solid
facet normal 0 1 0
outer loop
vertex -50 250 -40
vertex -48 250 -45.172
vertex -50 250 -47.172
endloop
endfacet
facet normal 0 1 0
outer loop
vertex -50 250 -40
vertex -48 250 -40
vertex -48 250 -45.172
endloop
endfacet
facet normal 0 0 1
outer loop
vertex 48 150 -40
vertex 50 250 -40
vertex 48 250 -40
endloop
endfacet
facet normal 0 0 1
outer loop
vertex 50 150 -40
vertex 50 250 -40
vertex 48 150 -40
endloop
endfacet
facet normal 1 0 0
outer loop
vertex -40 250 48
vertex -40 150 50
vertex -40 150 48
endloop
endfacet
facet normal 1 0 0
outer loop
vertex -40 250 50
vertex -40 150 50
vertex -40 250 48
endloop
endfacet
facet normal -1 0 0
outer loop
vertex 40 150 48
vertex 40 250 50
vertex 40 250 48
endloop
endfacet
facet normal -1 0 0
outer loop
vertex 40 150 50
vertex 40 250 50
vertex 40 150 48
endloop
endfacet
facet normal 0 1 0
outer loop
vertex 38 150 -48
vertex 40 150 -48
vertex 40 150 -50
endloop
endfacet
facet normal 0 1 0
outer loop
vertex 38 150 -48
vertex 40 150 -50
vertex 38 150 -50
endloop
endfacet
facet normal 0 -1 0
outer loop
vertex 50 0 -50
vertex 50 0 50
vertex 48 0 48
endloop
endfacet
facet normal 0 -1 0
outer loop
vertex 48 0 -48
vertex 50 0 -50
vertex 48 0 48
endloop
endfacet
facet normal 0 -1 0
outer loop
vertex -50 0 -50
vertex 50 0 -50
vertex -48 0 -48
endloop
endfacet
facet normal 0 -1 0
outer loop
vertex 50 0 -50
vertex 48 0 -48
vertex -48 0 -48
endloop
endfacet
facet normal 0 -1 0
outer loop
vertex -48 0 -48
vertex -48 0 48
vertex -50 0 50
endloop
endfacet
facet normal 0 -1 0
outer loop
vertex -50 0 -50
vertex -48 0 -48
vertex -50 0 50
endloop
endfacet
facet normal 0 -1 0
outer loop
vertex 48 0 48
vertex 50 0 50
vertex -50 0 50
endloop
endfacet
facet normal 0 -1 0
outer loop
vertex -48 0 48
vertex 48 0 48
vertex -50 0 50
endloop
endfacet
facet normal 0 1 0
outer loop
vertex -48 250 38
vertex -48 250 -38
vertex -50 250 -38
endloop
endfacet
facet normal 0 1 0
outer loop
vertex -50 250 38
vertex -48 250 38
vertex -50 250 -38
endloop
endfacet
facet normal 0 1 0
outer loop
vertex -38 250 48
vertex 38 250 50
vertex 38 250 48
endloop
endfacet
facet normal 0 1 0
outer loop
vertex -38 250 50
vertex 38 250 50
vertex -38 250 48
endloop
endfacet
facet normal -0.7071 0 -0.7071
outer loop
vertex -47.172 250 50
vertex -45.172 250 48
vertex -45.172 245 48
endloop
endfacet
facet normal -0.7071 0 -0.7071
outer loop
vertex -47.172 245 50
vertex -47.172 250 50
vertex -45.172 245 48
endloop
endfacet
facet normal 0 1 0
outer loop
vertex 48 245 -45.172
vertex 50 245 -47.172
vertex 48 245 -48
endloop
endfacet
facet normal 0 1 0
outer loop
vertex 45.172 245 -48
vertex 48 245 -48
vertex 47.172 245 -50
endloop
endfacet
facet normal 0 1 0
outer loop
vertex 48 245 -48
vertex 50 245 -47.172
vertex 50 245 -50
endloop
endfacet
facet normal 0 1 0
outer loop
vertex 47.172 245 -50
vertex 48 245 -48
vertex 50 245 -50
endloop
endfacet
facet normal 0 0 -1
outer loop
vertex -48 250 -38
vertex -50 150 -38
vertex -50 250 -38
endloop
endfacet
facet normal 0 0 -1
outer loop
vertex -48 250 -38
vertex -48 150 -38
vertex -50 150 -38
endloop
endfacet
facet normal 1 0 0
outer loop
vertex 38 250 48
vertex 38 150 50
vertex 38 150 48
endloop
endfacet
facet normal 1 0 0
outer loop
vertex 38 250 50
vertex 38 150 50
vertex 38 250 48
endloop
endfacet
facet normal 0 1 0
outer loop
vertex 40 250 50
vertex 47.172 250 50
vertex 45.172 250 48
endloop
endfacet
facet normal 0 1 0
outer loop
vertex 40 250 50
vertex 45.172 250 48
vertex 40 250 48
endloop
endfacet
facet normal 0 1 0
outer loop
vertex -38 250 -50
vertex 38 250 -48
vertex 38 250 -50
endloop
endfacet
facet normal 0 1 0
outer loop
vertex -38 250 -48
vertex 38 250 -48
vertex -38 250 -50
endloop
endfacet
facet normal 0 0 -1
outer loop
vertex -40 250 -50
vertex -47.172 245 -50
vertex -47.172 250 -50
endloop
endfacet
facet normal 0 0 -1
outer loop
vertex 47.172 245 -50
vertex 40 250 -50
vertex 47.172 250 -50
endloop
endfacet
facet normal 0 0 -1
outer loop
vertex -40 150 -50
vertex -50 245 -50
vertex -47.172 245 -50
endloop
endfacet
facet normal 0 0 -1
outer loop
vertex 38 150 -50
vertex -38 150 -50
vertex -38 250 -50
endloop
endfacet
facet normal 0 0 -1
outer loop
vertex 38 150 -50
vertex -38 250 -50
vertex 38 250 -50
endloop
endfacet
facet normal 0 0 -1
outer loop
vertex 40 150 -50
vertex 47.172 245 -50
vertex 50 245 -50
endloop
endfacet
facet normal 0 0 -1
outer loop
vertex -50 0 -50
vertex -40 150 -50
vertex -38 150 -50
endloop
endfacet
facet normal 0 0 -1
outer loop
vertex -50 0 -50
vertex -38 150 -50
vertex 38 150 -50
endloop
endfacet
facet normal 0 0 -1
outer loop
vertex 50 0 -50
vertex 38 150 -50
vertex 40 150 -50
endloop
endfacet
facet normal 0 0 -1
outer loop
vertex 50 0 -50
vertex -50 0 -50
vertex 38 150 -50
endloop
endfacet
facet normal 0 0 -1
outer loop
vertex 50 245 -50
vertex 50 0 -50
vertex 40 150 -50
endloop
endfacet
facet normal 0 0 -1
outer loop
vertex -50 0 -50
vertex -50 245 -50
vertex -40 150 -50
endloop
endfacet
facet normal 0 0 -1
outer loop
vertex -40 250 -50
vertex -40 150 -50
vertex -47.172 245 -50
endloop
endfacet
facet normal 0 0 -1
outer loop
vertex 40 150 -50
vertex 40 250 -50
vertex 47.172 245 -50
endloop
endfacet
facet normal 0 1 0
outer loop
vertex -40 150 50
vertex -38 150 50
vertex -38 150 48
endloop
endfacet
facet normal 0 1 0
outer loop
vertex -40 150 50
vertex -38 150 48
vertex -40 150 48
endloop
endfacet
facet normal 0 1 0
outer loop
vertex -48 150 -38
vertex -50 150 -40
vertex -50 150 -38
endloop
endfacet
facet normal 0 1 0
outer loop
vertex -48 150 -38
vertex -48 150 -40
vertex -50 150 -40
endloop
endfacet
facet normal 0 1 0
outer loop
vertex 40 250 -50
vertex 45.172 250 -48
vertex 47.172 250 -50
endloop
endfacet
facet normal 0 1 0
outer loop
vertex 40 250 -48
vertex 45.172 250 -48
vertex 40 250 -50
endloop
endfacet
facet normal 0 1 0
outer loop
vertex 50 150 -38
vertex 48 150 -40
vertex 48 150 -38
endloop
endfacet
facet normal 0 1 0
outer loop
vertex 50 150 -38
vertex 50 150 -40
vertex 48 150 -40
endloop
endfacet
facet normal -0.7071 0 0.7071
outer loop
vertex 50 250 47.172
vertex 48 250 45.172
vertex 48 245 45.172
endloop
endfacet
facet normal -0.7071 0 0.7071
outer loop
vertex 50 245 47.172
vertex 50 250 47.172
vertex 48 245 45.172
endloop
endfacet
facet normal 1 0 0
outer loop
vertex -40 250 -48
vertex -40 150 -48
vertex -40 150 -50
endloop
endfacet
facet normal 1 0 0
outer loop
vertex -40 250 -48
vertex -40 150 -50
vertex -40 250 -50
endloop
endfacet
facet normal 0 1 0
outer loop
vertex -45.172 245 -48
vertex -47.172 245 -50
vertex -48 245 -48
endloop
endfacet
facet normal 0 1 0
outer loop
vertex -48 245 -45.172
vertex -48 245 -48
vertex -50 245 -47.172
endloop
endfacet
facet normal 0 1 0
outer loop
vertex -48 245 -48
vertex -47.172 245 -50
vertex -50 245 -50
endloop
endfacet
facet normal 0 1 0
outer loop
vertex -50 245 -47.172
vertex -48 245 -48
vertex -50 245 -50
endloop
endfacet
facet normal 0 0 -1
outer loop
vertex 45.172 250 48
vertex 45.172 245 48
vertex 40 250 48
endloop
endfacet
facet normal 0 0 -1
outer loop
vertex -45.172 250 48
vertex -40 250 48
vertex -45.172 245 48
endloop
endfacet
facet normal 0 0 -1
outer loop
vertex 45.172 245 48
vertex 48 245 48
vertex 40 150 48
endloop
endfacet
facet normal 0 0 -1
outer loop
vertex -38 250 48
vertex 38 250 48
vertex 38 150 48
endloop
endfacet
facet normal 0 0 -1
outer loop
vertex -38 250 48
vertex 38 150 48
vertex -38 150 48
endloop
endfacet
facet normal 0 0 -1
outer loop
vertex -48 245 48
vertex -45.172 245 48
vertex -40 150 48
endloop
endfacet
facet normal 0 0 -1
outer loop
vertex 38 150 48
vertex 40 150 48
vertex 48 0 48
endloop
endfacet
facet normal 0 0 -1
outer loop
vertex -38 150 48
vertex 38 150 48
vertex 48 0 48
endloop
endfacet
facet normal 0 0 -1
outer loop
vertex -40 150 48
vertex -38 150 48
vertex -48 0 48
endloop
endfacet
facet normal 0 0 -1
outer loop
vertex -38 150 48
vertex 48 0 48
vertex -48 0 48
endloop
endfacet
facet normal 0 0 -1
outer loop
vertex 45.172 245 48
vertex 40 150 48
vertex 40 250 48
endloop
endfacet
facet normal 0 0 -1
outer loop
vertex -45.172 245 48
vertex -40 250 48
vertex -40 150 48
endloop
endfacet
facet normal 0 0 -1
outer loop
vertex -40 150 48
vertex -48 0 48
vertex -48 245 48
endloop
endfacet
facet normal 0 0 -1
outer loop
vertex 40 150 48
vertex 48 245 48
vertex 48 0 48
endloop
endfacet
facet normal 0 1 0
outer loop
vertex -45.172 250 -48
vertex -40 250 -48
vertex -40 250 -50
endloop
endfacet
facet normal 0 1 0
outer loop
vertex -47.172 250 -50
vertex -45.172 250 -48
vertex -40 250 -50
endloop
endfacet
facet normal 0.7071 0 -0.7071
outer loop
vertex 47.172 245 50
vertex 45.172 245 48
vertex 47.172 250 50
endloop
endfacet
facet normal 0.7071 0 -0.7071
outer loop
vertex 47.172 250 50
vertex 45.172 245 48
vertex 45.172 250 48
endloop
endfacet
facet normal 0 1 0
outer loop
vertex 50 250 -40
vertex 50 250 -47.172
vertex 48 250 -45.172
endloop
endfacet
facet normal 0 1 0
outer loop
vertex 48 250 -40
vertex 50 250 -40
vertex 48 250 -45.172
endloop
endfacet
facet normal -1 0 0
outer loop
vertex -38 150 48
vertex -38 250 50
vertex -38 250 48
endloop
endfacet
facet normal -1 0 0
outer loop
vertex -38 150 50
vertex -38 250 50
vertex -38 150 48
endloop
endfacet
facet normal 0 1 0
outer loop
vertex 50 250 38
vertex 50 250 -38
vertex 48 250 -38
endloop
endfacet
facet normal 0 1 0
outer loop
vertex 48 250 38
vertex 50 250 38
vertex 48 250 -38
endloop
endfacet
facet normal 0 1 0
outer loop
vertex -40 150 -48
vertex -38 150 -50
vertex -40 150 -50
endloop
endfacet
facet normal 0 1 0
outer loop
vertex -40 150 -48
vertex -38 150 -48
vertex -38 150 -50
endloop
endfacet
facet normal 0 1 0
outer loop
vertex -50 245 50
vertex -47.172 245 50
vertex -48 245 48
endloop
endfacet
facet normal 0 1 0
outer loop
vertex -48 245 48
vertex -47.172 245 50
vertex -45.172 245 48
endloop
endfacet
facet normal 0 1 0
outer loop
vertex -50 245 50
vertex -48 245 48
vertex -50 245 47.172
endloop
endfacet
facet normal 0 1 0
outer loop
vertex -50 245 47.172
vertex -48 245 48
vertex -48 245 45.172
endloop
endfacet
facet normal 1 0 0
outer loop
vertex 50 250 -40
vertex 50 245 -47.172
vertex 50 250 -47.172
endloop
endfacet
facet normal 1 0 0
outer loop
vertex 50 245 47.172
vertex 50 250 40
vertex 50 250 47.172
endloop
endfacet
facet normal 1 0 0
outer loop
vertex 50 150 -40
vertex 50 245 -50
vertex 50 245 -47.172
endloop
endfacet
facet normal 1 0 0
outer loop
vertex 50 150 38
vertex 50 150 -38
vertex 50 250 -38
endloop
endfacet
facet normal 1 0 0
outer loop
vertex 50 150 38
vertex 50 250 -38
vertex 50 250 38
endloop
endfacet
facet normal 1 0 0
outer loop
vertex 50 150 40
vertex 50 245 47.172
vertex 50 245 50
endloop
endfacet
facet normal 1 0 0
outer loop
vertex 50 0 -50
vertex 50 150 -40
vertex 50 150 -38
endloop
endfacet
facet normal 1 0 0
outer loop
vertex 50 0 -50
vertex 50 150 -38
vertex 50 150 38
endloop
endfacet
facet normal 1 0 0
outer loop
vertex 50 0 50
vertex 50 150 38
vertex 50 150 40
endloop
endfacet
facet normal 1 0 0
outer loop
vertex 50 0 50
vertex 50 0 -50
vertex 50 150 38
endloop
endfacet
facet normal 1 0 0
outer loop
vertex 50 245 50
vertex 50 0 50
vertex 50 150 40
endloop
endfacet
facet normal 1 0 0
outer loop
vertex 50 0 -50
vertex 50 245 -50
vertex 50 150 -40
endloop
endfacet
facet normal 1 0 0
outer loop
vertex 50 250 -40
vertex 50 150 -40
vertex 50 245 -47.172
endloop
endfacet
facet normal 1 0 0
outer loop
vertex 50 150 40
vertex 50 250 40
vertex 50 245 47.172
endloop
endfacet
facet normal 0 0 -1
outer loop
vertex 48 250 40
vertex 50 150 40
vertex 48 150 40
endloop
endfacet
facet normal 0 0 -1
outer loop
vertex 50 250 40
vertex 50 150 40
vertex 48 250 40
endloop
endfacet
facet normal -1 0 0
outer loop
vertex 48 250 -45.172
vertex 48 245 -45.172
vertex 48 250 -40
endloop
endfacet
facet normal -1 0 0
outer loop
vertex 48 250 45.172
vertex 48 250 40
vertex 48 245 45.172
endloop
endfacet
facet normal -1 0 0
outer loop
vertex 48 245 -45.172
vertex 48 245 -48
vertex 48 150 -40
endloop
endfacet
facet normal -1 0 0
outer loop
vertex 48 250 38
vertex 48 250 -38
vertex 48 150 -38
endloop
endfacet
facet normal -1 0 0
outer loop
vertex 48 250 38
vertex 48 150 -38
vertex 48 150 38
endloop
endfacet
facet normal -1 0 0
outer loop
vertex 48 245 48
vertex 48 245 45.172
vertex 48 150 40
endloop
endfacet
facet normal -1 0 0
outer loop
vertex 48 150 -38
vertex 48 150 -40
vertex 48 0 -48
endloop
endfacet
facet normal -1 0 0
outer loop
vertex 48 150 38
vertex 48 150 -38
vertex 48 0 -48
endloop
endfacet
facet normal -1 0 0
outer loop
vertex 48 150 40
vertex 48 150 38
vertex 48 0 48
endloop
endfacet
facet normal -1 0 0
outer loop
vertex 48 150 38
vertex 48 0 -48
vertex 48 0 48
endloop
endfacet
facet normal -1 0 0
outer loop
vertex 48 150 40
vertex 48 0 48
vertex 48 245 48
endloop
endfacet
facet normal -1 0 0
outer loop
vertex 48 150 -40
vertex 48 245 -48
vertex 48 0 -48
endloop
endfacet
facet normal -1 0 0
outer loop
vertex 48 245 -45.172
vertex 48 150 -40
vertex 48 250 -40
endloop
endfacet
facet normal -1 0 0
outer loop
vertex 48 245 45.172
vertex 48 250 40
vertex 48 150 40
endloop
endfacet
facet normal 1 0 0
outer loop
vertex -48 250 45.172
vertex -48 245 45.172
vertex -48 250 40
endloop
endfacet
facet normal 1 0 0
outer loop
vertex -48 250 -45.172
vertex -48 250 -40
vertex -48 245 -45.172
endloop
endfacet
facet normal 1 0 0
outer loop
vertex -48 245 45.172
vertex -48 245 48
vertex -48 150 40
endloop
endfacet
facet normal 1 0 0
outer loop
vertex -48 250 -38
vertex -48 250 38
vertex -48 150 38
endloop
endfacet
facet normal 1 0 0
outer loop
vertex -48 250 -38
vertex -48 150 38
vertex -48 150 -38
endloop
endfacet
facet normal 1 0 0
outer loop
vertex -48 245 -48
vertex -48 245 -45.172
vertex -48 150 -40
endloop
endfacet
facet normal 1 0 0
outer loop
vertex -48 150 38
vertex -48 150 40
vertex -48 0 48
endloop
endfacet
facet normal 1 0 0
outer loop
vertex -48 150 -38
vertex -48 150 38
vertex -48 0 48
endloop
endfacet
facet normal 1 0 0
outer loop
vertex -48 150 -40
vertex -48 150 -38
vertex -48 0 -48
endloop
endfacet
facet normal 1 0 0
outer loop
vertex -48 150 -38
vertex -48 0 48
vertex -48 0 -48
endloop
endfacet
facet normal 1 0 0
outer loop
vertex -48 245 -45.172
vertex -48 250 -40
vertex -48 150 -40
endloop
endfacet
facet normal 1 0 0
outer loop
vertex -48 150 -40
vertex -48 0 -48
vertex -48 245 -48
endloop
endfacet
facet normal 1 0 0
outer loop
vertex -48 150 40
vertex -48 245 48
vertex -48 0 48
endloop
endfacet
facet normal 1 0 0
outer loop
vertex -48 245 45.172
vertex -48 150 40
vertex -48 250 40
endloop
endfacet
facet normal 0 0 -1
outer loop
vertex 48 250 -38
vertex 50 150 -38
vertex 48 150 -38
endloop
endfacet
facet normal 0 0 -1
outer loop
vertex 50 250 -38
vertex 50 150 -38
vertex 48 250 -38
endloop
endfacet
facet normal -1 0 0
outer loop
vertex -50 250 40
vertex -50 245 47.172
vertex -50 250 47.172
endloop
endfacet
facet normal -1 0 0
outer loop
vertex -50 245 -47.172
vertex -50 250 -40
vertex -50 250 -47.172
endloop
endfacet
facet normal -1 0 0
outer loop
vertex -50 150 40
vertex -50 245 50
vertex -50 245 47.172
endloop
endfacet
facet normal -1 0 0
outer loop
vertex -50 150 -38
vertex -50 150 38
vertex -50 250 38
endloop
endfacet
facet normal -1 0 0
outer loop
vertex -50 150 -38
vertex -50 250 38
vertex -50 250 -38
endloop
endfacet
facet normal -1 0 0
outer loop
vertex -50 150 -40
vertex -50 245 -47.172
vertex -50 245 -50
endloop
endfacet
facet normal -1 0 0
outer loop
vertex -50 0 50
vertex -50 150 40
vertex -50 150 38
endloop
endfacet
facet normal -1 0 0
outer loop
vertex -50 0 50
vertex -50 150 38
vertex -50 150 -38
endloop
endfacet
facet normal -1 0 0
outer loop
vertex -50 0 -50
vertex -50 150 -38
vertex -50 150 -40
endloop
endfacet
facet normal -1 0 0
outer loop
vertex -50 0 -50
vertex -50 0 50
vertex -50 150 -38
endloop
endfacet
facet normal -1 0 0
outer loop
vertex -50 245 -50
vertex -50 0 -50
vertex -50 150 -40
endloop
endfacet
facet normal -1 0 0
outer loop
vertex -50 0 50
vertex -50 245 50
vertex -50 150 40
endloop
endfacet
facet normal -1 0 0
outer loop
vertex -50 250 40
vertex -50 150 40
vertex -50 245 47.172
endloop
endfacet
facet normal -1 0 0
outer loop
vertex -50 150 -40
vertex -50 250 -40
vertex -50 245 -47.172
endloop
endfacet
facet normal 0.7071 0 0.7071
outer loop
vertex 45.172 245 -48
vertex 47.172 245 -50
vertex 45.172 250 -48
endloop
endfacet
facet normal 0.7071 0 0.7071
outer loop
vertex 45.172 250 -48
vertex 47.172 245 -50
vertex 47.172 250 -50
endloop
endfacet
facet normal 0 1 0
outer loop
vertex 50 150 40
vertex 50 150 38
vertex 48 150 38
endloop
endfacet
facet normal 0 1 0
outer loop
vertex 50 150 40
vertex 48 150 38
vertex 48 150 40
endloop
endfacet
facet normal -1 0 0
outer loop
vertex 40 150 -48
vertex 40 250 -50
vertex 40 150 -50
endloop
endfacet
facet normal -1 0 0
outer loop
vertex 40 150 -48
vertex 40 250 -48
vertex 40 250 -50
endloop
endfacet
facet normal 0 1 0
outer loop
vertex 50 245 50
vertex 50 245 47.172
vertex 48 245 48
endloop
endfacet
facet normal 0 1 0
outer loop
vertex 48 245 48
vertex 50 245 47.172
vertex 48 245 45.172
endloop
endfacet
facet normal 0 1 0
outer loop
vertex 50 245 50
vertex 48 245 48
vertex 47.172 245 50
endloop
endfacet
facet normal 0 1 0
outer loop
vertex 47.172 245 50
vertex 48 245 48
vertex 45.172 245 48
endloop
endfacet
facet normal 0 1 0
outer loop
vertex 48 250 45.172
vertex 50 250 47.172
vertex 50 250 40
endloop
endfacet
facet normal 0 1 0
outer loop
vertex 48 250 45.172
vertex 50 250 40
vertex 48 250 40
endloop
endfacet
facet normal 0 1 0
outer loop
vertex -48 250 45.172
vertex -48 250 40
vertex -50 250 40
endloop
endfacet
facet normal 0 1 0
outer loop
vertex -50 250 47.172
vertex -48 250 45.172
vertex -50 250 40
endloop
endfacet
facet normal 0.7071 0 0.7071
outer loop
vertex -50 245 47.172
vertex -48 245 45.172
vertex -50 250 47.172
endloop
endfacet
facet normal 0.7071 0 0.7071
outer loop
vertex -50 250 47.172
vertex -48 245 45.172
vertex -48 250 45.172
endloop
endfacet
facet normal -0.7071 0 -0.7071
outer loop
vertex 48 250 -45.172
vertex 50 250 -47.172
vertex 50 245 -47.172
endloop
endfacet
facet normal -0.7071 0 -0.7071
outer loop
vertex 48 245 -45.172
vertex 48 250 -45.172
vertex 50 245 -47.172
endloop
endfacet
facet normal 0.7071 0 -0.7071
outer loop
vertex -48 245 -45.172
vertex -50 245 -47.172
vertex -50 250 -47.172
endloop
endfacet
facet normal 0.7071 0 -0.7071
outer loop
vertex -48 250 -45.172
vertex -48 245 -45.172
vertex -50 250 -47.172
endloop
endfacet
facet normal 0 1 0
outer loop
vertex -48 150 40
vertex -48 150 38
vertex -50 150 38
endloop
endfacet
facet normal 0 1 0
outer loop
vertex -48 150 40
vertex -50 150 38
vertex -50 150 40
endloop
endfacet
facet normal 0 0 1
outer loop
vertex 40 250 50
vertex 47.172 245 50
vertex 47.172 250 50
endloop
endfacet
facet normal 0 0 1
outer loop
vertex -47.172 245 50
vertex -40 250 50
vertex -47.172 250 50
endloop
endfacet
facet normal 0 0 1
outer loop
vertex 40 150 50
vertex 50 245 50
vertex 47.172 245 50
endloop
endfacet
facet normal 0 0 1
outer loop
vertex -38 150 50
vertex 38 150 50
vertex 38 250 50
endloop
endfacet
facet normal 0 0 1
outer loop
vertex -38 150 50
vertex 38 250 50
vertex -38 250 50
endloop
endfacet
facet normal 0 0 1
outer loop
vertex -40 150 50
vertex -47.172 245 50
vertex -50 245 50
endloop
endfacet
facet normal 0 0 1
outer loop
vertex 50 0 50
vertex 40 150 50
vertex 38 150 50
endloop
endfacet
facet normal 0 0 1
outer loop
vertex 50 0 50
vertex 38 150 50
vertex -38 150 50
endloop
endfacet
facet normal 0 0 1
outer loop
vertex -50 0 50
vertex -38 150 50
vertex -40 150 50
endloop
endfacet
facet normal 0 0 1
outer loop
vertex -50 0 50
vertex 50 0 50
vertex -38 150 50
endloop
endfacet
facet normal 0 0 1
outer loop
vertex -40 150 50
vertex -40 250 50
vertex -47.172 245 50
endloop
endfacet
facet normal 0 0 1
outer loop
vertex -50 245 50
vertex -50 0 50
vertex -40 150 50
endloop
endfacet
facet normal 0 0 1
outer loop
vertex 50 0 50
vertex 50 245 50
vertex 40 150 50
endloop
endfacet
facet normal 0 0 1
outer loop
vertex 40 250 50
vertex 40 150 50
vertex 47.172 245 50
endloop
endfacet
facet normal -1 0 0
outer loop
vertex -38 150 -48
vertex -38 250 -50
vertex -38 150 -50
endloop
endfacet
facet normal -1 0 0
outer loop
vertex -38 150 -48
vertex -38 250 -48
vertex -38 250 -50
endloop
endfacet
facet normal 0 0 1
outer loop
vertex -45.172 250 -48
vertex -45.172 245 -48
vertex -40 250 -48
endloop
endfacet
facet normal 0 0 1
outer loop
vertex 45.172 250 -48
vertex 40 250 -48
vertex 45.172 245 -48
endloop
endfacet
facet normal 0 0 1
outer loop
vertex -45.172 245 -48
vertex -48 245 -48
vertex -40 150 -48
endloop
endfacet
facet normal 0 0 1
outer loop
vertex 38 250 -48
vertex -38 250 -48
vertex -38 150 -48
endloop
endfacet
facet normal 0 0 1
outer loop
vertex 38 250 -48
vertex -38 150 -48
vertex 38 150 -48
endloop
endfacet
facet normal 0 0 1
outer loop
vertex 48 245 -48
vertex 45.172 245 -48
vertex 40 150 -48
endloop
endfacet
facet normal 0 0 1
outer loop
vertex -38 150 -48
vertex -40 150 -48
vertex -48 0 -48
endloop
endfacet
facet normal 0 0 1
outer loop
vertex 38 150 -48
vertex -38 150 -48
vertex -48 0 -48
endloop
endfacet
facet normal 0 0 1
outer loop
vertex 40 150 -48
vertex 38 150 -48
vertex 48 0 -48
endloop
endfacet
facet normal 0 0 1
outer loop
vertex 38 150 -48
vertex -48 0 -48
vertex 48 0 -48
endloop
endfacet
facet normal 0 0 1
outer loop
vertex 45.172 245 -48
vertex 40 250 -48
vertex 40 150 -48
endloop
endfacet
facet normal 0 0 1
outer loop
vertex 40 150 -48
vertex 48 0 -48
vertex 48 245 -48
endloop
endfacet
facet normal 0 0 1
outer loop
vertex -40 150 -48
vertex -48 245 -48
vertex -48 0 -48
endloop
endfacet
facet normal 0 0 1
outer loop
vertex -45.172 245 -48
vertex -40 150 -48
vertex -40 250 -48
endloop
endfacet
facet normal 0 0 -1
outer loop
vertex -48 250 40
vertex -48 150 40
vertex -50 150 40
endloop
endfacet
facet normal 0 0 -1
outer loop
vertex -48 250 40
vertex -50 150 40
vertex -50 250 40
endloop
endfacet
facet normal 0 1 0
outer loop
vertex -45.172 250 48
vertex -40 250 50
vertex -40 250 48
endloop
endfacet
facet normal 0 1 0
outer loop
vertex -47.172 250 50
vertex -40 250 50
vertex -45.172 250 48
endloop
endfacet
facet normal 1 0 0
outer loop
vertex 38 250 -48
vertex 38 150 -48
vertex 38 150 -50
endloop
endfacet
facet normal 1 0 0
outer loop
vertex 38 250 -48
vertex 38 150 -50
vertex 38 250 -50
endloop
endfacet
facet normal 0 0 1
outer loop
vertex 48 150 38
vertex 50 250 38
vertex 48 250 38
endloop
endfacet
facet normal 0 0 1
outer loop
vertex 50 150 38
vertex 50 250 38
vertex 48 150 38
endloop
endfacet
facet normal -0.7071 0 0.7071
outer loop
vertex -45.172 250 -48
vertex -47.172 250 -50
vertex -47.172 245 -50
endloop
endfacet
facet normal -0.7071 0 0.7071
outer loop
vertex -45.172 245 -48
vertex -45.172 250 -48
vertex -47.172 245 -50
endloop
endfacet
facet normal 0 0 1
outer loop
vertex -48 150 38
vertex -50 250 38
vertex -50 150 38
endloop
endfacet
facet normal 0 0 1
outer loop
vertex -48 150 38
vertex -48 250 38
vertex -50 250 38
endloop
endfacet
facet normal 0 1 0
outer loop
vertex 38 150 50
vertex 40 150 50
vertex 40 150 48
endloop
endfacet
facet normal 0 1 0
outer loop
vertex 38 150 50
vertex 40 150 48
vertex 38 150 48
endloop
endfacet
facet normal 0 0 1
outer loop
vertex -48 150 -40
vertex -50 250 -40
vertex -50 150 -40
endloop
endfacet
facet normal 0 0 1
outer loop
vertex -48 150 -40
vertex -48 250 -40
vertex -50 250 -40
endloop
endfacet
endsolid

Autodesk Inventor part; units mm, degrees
ref_plane "YZ Plane" through (0, 0, 0) normal (1, 0, 0) x (0, 1, 0)
sketch "Sketch1" plane through (0, 0, 0) normal (0, 1, 0) x (-1, 0, 0)
  line L0 (-50, 50) -> (50, 50)
  line L1 (50, 50) -> (50, -50)
  line L2 (50, -50) -> (-50, -50)
  line L3 (-50, -50) -> (-50, 50)
  line L4 (-50, 50) -> (50, -50) construction
  line L5 (50, 50) -> (-50, -50) construction
  line L6 (-48, 48) -> (48, 48)
  line L7 (48, 48) -> (48, -48)
  line L8 (48, -48) -> (-48, -48)
  line L9 (-48, -48) -> (-48, 48)
  line L10 (-48, 48) -> (48, -48) construction
  line L11 (48, 48) -> (-48, -48) construction
  point P0 (0, 0)
  dimension "d0" = 100
  dimension "d1" = 100
  dimension "d2" = 2
extrude "Extrusion1" add sketch "Sketch1" along normal blind 250
sketch "Sketch3" plane through (50, 250, 50) normal (1, 0, 0) x (0, 0, -1)
  line L0 (2, 0) -> (98, 0) projected
  line L1 (10, 0) -> (12, 0)
  line L2 (12, 0) -> (12, -100)
  line L3 (12, -100) -> (10, -100)
  line L4 (10, -100) -> (10, 0)
  line L5 (0, -250) -> (0, 0) projected
  point P0 (50, -250)
  point P1 (0, -146)
  point P2 (12, 0)
  dimension "d9" = 100
  dimension "d10" = 2
  dimension "d11" = 10
extrude "Extrusion3" cut sketch "Sketch3" against normal blind 220
mirror "Mirror2" about plane through (0, 0, 0) normal (0, 0, 1) of "Extrusion3"
sketch "Sketch4" plane through (-50, 250, 50) normal (0, 0, 1) x (1, 0, 0)
  line L0 (10, 0) -> (12, 0)
  line L1 (12, 0) -> (12, -100)
  line L2 (12, -100) -> (10, -100)
  line L3 (10, -100) -> (10, 0)
  line L4 (0, -250) -> (0, 0) projected
  line L5 (0, 0) -> (100, 0) projected
  point P0 (50, -250)
  point P1 (0, -146)
  point P2 (10, -50)
  point P3 (11, 0)
  dimension "d14" = 10
  dimension "d15" = 2
  dimension "d16" = 100
  dimension "d17" = 0
extrude "Extrusion4" cut sketch "Sketch4" against normal blind 220
mirror "Mirror3" about plane through (0, 0, 0) normal (1, 0, 0) of "Extrusion4"
ref_plane "Work Plane1" through (50, 104, 50) normal (-0.7071, 0, 0.7071) x (0, -1, 0)
sketch "Sketch5" plane through (50, 104, 50) normal (-0.7071, 0, 0.7071) x (0, -1, 0)
  line L0 (-141, -72.7107) -> (-146, -72.7107)
  line L1 (-146, -72.7107) -> (-146, -68.7107)
  line L2 (-146, -68.7107) -> (-141, -68.7107)
  line L3 (-141, -68.7107) -> (-141, -72.7107)
  line L4 (-141, -72.7107) -> (-146, -68.7107) construction
  line L5 (-146, -72.7107) -> (-141, -68.7107) construction
  line L6 (104, -70.7107) -> (-146, -70.7107) projected
  point P0 (-143.5, -70.7107)
  point P1 (0, -70.7107)
  dimension "d20" = 5
  dimension "d21" = 4
  dimension "d22" = 0
  dimension "d23" = 0
extrude "Extrusion5" cut sketch "Sketch5" along normal mid plane 220
ref_plane "Work Plane2" through (-48, 104, 50) normal (0.7071, 0, 0.7071) x (0, 1, 0)
sketch "Sketch6" plane through (-48, 104, 50) normal (0.7071, 0, 0.7071) x (0, 1, 0)
  line L0 (141, -67.2965) -> (146, -67.2965)
  line L1 (146, -67.2965) -> (146, -71.2965)
  line L2 (146, -71.2965) -> (141, -71.2965)
  line L3 (141, -71.2965) -> (141, -67.2965)
  line L4 (-104, -69.2965) -> (146, -69.2965) projected
  line L5 (141, -67.2965) -> (146, -71.2965) construction
  line L6 (146, -67.2965) -> (141, -71.2965) construction
  line L7 (146, -62.2254) -> (146, -69.2965) projected
  point P0 (143.5, -69.2965)
  point P1 (0, -69.2965)
  dimension "d26" = 4
  dimension "d27" = 5
  dimension "d28" = 0
extrude "Extrusion6" cut sketch "Sketch6" along normal mid plane 220
properties part number "FLueExtension"
